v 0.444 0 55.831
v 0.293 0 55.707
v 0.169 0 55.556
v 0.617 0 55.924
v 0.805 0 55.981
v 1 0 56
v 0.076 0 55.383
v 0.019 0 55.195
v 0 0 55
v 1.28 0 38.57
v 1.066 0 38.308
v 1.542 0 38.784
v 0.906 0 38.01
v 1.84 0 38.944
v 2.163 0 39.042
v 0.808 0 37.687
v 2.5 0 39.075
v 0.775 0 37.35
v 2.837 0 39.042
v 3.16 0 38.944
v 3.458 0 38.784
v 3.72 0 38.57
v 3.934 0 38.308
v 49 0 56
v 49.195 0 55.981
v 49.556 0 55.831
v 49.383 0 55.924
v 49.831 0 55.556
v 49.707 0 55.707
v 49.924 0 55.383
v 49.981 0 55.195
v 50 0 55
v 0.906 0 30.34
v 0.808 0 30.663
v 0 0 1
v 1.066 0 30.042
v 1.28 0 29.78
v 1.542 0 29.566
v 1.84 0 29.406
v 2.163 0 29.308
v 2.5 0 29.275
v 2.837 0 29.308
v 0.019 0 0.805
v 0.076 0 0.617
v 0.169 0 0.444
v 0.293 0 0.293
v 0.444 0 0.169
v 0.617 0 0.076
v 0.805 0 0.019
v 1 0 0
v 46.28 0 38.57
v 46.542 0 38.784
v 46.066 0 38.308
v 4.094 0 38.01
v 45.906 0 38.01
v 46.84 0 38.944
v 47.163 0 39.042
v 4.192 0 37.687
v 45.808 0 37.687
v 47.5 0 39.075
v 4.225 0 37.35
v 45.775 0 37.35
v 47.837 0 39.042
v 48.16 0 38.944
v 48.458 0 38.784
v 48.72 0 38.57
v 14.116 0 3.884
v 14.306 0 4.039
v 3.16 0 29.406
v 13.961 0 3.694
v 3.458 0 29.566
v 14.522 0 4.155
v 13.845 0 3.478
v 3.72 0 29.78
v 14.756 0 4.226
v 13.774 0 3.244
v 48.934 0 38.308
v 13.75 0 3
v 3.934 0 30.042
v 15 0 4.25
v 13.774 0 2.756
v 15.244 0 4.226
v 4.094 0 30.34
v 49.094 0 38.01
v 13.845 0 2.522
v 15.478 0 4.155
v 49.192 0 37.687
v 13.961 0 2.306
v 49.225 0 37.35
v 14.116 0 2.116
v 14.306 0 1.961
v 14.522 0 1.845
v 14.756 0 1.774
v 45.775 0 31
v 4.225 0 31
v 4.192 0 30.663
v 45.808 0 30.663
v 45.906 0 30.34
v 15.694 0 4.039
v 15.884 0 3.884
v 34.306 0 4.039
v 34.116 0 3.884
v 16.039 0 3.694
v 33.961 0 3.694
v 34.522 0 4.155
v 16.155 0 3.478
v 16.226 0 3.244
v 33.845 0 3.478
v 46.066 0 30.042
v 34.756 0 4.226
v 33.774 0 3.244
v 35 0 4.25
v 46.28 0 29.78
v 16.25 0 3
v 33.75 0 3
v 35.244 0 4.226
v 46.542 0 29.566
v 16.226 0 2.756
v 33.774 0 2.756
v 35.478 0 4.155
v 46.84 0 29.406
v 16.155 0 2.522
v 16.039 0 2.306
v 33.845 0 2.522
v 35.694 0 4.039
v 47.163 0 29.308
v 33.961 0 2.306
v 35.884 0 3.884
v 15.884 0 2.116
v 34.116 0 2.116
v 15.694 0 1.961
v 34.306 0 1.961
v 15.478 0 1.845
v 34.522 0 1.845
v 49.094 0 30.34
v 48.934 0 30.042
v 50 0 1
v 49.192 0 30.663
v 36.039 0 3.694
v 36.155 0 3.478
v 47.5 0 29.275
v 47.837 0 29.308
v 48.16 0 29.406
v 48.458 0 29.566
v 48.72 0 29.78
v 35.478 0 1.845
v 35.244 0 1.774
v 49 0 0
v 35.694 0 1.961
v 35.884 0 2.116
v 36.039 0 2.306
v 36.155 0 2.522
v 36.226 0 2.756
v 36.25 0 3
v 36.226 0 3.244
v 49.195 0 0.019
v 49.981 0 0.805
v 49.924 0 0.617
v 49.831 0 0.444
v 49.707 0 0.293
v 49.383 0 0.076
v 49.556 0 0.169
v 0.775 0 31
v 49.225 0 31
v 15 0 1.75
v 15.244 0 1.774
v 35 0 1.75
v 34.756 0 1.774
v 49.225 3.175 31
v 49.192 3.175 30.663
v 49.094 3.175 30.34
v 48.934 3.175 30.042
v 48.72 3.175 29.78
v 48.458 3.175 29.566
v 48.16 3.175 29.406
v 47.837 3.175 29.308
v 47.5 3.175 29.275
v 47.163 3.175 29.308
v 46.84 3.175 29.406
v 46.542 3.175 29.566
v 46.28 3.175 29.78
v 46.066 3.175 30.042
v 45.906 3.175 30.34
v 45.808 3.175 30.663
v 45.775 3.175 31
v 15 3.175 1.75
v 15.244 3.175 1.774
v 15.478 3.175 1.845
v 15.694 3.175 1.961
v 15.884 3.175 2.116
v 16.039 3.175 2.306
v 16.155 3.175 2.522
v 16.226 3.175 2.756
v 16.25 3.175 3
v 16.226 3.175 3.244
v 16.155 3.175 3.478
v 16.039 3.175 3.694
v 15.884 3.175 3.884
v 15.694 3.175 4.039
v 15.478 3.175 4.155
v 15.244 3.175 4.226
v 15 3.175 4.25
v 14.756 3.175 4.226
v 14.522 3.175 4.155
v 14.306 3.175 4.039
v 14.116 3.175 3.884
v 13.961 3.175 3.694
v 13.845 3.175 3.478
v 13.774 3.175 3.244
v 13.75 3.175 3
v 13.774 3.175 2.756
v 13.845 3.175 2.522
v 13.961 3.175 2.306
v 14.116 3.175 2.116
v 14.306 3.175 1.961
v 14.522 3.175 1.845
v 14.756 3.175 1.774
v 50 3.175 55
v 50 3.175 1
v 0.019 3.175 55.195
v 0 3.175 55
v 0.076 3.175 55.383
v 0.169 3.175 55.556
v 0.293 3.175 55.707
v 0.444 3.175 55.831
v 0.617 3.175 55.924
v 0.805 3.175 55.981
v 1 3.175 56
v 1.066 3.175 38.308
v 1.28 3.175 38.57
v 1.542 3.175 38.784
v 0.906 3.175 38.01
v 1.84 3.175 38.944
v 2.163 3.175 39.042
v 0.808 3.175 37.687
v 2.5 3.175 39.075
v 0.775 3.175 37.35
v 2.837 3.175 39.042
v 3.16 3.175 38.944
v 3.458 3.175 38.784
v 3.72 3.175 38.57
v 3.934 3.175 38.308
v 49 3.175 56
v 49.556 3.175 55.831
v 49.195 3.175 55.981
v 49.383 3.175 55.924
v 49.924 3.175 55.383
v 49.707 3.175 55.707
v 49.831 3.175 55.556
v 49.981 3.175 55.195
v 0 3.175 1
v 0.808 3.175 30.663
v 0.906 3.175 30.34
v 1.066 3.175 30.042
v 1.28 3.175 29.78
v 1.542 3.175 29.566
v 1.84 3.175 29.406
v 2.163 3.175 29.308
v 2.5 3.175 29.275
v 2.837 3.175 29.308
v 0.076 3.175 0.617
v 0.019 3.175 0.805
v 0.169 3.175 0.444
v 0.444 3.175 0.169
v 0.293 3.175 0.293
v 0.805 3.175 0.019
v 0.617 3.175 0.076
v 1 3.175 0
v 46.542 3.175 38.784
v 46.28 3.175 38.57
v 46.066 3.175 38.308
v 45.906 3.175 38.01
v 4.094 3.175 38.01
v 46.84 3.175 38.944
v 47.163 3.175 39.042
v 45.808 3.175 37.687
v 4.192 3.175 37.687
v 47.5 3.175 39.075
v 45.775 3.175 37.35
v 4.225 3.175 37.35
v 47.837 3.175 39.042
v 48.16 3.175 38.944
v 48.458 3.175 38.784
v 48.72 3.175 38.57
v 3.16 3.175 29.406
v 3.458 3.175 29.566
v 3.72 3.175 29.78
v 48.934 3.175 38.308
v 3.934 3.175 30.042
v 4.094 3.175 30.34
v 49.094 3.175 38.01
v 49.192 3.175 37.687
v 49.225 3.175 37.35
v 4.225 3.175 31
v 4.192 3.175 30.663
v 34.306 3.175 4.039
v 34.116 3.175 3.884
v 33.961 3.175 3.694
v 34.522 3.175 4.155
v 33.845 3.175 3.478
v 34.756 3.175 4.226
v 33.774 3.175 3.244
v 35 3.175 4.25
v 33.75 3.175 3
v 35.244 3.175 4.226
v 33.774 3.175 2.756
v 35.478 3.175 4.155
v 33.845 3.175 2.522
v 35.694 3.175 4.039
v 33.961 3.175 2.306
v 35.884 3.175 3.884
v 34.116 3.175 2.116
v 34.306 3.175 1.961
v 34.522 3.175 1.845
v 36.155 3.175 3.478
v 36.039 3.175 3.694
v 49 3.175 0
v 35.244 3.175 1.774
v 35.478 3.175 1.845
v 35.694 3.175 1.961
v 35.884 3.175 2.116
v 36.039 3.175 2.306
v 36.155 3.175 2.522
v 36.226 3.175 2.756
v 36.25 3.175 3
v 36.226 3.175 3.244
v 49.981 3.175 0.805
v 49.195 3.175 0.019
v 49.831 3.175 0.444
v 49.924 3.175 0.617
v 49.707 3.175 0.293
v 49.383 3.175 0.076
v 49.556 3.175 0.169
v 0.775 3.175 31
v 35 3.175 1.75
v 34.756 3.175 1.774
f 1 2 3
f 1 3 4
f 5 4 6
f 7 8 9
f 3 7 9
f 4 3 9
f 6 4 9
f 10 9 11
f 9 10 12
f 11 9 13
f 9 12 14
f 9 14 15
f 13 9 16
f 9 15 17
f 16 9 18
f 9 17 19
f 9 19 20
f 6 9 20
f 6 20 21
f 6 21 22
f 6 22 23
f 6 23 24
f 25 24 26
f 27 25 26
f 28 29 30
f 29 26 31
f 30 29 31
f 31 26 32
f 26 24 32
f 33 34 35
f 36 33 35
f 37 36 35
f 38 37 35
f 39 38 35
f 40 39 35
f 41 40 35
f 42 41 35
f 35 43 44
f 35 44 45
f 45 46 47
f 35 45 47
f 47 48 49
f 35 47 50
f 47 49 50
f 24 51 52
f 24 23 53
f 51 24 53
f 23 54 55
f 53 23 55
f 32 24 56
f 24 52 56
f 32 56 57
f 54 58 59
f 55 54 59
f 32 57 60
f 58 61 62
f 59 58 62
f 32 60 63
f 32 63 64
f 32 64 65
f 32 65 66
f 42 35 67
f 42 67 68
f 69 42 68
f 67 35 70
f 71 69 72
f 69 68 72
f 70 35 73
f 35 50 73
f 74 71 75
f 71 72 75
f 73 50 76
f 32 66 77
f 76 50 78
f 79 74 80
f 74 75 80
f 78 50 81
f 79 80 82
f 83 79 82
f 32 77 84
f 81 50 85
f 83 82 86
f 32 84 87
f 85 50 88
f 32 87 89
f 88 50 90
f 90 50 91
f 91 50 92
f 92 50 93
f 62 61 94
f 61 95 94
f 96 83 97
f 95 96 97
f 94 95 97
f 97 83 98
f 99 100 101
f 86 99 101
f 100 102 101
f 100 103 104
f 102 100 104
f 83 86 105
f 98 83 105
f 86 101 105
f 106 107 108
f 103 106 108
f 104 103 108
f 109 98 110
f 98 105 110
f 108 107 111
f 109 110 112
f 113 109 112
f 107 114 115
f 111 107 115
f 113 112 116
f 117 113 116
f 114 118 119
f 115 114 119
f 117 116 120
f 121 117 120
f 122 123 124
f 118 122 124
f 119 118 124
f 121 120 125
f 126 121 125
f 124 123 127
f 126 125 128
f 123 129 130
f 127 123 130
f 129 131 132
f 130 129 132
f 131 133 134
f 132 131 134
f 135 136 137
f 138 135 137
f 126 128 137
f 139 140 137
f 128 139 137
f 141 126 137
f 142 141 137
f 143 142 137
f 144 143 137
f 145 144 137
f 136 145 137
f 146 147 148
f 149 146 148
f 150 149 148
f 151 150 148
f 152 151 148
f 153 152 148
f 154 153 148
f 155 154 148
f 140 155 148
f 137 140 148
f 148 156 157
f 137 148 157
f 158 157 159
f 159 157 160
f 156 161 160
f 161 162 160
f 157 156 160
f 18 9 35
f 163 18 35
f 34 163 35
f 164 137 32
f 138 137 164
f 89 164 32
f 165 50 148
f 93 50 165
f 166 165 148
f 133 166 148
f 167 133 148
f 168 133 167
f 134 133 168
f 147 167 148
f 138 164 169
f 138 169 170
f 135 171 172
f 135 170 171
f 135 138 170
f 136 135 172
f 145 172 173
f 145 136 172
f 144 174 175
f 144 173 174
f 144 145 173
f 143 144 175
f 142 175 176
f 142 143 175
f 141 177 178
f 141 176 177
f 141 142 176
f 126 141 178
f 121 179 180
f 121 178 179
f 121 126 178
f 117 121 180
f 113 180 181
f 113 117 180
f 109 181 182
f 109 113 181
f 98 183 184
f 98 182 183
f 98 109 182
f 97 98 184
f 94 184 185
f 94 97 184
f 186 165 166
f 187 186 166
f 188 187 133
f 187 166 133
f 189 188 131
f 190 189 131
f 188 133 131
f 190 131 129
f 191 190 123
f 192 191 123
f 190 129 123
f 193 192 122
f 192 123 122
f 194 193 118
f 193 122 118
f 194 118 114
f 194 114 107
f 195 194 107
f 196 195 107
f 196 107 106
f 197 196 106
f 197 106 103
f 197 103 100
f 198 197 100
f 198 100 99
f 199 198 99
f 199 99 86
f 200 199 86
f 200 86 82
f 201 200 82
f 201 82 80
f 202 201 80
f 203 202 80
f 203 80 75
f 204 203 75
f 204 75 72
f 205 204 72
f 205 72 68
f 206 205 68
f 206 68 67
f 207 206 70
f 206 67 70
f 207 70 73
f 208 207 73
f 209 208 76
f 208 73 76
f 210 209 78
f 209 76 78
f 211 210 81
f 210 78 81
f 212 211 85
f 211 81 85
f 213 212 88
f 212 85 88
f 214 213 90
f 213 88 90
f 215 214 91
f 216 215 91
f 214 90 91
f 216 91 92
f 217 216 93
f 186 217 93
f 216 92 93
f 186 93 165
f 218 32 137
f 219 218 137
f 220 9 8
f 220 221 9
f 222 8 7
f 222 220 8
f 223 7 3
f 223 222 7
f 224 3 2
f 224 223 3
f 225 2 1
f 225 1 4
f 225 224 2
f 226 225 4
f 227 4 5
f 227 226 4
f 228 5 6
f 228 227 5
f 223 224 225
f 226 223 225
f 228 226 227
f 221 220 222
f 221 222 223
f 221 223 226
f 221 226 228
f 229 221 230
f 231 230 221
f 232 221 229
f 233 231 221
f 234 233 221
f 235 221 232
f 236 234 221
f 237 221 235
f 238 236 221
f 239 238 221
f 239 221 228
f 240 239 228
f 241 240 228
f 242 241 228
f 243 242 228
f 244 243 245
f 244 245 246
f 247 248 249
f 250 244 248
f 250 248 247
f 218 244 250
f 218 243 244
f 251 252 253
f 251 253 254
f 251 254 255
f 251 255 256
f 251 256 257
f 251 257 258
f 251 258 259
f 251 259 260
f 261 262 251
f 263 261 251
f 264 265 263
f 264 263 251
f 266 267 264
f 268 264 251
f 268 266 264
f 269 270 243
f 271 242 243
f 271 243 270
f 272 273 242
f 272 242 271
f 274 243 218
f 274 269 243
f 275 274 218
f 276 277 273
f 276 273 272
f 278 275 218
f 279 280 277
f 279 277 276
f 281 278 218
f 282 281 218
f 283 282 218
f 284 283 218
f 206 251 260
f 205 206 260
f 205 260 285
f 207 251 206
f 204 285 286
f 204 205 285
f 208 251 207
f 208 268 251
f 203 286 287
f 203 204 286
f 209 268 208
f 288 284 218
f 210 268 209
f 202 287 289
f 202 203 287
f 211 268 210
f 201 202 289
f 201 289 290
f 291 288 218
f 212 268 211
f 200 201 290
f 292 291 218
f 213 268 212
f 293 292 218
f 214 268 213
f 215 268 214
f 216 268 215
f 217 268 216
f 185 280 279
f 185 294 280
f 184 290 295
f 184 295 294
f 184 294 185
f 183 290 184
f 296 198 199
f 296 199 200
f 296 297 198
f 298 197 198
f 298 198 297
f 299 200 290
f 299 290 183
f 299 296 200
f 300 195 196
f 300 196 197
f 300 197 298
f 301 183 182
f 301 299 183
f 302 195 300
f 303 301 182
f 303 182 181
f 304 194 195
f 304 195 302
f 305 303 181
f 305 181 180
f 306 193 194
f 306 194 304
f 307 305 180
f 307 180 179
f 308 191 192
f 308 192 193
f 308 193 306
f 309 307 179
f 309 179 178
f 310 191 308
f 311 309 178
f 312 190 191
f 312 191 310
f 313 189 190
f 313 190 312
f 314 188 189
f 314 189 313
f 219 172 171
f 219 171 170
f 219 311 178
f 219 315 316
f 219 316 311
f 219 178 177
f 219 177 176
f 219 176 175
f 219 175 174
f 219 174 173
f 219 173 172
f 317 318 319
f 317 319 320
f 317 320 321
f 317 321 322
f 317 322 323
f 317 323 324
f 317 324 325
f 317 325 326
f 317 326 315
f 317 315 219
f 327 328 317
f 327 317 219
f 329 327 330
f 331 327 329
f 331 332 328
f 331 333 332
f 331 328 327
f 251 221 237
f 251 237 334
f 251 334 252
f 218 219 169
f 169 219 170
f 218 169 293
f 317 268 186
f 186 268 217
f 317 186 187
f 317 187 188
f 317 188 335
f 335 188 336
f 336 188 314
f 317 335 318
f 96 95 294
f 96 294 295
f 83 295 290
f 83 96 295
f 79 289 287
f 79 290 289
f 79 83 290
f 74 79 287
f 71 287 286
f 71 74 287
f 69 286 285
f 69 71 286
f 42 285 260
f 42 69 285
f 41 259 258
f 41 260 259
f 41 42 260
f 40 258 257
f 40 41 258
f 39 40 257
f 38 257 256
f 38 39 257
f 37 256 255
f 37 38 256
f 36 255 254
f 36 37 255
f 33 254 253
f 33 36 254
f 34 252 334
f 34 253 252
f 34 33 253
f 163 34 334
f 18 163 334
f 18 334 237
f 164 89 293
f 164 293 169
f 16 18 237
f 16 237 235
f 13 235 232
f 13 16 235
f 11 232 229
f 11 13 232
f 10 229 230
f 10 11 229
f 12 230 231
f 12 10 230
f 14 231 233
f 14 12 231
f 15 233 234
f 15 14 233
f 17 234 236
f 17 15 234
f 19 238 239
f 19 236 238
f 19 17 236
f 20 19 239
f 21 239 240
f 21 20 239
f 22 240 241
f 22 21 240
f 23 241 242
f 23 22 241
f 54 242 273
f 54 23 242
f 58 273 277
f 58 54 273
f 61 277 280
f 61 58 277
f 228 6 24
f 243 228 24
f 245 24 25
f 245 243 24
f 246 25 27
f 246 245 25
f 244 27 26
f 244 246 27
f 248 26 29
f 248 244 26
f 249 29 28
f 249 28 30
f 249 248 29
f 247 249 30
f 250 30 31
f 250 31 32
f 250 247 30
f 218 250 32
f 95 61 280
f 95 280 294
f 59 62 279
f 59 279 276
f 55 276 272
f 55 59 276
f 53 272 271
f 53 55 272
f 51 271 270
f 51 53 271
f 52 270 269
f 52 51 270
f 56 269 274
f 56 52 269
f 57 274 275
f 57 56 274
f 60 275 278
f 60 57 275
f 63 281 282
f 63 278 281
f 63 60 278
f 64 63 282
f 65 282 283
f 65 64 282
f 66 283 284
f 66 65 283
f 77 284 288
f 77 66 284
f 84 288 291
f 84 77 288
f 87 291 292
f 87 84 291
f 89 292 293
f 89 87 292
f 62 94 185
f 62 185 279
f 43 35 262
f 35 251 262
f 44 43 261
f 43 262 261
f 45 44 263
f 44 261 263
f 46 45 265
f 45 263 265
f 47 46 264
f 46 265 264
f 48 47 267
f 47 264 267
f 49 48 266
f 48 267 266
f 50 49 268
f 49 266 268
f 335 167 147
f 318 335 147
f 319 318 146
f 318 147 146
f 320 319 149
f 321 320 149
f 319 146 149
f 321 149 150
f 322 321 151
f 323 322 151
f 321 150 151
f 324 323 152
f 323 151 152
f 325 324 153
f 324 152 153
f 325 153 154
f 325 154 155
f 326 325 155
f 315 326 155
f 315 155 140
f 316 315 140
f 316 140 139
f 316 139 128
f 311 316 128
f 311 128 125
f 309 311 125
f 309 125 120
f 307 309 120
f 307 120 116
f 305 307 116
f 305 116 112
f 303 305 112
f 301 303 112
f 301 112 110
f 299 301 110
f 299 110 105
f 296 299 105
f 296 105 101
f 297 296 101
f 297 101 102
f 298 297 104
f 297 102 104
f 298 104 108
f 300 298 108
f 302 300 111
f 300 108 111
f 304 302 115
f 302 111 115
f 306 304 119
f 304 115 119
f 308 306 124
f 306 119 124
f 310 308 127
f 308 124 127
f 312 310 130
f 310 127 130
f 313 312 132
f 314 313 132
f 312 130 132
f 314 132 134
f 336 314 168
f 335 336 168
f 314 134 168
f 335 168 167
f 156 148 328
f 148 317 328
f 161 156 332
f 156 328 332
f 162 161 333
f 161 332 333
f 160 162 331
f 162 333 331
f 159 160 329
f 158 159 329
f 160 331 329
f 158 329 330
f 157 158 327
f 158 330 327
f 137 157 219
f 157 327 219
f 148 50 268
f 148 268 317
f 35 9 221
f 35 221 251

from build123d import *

# Parameters (mm, degrees)
SKETCH1_W               = 50
SKETCH1_H               = 56
SKETCH1_R               = 1.1
BOSS_EXTRUDE1_DEPTH     = 3.175
FILLET1_R               = 1
M3X0_5_TAPPED_HOLE1_D   = 2.5
CUT_EXTRUDE1_DEPTH      = 76.140406074
CUT_EXTRUDE1_DEPTH_BACK = 76.140406074


with BuildPart() as part:
    # Sketch1 → Boss-Extrude1 (new body)
    with BuildSketch(Plane(origin=(0, 0, 0), x_dir=(1, 0, 0), z_dir=(0, 1, 0))):
        with Locations((25, -28)):
            Rectangle(SKETCH1_W, SKETCH1_H)
        with Locations(Location((15, -3, 0), (0, 0, 270))):
            Circle(SKETCH1_R, mode=Mode.SUBTRACT)
        with Locations(Location((35, -3, 0), (0, 0, 270))):
            Circle(SKETCH1_R, mode=Mode.SUBTRACT)
    extrude(amount=BOSS_EXTRUDE1_DEPTH)

    # Fillet1
    fillet1_edges = [part.edges().sort_by_distance(p)[0] for p in [
        (0, 1.5875, 0),
        (50, 1.5875, 0),
        (50, 1.5875, 56),
        (0, 1.5875, 56),
    ]]
    fillet(fillet1_edges, radius=FILLET1_R)

    # M3x0.5 Tapped Hole1 (through all)
    with Locations(Plane(origin=(15, 3.175, 3), x_dir=(0, 0, 1), z_dir=(0, 1, 0))):
        with Locations((0, 0), (0, 20)):
            Hole(M3X0_5_TAPPED_HOLE1_D / 2)

    # Sketch3 → Cut-Extrude1 (cut, two sides: drawn at the far end of the back side and taken through both)
    with BuildSketch(Plane(origin=(0, 3.175, 0), x_dir=(1, 0, 0), z_dir=(0, 1, 0)).offset(-CUT_EXTRUDE1_DEPTH_BACK)):
        with BuildLine():
            Line((0.775, -31), (0.775, -37.35))
            ThreePointArc((0.775, -37.35), (2.5, -39.075), (4.225, -37.35))
            Line((4.225, -37.35), (4.225, -31))
            ThreePointArc((4.225, -31), (2.5, -29.275), (0.775, -31))
        make_face()
        with BuildLine():
            Line((45.775, -31), (45.775, -37.35))
            ThreePointArc((45.775, -37.35), (47.5, -39.075), (49.225, -37.35))
            Line((49.225, -37.35), (49.225, -31))
            ThreePointArc((49.225, -31), (47.5, -29.275), (45.775, -31))
        make_face()
    extrude(amount=CUT_EXTRUDE1_DEPTH + CUT_EXTRUDE1_DEPTH_BACK, mode=Mode.SUBTRACT)


solid = part.part
